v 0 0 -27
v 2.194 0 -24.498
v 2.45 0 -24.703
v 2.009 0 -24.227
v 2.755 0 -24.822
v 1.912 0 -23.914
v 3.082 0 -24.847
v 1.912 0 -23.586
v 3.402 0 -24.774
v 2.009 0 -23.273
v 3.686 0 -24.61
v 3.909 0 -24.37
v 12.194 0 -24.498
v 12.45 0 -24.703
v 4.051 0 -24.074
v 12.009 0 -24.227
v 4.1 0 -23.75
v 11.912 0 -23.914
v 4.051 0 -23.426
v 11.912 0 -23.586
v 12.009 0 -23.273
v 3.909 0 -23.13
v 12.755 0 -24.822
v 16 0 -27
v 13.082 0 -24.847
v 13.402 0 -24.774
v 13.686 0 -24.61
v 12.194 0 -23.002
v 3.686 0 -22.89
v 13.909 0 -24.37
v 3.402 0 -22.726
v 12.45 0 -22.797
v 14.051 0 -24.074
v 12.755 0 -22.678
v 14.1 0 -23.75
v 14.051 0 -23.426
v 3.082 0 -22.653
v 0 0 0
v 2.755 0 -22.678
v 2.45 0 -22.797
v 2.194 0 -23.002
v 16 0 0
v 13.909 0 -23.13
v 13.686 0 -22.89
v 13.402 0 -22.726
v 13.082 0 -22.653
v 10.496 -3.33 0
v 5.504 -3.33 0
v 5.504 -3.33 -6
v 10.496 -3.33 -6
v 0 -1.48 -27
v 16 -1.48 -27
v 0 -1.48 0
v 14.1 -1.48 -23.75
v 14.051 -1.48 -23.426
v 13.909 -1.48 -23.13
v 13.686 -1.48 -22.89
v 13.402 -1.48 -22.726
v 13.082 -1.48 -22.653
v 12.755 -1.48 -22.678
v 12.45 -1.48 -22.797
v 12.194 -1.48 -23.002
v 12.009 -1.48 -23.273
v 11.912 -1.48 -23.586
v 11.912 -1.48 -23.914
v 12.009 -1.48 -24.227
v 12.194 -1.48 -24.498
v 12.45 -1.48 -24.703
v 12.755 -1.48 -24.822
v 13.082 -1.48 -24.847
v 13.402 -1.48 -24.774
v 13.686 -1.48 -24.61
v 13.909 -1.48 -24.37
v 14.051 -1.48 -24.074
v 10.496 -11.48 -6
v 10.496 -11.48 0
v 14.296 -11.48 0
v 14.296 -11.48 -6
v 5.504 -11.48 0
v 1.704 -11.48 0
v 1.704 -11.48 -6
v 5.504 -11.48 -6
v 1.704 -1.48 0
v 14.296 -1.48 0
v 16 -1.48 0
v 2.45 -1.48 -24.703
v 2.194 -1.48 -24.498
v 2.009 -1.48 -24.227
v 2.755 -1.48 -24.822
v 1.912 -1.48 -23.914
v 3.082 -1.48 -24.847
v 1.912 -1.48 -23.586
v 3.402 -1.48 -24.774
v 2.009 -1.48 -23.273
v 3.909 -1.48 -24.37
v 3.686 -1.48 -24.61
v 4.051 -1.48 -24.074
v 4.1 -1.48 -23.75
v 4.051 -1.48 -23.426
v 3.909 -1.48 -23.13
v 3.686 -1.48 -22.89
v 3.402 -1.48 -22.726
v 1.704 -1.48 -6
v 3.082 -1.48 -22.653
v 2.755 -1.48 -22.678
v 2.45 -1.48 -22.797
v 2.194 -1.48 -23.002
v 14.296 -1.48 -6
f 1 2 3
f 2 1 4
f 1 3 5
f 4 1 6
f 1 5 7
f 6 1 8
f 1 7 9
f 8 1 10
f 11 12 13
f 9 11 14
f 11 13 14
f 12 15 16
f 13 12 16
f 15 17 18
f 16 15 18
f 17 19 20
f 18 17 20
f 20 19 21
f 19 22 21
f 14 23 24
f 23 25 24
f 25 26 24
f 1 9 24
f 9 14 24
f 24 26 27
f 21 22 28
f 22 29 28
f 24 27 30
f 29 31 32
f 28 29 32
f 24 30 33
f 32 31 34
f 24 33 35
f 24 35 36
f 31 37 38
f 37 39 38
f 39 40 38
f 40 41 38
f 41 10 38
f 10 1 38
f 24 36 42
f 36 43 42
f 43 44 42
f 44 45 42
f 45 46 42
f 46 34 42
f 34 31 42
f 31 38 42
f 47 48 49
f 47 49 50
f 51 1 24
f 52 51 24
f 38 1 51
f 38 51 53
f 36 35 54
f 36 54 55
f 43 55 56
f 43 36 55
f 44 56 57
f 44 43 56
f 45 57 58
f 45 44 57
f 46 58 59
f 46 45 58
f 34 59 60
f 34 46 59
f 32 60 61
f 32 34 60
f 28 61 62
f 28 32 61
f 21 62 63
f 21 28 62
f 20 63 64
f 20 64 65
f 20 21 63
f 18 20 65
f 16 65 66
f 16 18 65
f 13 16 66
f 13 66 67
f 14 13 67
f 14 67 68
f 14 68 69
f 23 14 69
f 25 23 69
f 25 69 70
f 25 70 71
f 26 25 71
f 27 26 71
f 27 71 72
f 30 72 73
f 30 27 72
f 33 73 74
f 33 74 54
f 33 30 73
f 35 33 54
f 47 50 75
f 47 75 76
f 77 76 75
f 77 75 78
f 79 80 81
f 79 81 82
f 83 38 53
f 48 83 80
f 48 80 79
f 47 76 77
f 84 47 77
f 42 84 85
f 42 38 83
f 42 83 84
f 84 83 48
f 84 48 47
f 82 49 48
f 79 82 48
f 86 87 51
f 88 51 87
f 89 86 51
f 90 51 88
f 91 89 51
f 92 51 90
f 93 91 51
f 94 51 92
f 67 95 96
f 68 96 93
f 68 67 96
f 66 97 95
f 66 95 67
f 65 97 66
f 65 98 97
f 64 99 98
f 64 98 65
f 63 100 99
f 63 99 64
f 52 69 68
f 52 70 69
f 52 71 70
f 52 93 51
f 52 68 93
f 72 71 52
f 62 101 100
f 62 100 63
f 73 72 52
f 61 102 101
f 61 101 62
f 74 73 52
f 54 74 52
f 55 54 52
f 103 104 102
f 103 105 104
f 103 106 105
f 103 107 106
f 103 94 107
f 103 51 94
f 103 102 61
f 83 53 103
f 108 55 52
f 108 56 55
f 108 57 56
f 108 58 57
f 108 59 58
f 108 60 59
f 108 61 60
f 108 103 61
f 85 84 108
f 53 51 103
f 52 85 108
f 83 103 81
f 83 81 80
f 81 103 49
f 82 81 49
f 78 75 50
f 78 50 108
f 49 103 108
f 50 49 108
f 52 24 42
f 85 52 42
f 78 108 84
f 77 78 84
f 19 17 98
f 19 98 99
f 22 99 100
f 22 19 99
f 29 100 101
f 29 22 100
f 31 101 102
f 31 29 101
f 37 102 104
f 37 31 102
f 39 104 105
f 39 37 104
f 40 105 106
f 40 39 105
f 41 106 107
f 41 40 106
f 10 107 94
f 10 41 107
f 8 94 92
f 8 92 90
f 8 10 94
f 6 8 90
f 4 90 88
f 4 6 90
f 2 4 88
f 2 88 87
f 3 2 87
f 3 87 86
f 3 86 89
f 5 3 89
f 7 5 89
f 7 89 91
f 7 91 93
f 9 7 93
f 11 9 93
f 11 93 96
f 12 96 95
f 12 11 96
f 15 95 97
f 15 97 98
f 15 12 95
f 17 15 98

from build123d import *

# Parameters (mm, degrees)
F0_W     = 16
F0_H     = 27
F0_R     = 1.1
F1_DEPTH = 1.47957
F3_W     = 3.8
F3_H     = 6
F4_DEPTH = 10
F3_W_2   = 4.992
F5_DEPTH = 1.85


with BuildPart() as f1:
    # F0 (on Front) → F1 (new body)
    with BuildSketch(Plane.XZ):
        with Locations((8, -13.5)):
            Rectangle(F0_W, F0_H)
        with Locations((3, -23.75)):
            Circle(F0_R, mode=Mode.SUBTRACT)
        with Locations((13, -23.75)):
            Circle(F0_R, mode=Mode.SUBTRACT)
    extrude(amount=F1_DEPTH)

    # F3 (on face) → F4 (join)
    with BuildSketch(Plane.XZ.offset(1.47957)):
        with Locations((3.604, -3)):
            Rectangle(F3_W, F3_H)
        with Locations((12.396, -3)):
            Rectangle(F3_W, F3_H)
    extrude(amount=F4_DEPTH)

    # F3 (on face) → F5 (join)
    with BuildSketch(Plane.XZ.offset(1.47957)):
        with Locations((8, -3)):
            Rectangle(F3_W_2, F3_H)
    extrude(amount=F5_DEPTH)


solid = f1.part
